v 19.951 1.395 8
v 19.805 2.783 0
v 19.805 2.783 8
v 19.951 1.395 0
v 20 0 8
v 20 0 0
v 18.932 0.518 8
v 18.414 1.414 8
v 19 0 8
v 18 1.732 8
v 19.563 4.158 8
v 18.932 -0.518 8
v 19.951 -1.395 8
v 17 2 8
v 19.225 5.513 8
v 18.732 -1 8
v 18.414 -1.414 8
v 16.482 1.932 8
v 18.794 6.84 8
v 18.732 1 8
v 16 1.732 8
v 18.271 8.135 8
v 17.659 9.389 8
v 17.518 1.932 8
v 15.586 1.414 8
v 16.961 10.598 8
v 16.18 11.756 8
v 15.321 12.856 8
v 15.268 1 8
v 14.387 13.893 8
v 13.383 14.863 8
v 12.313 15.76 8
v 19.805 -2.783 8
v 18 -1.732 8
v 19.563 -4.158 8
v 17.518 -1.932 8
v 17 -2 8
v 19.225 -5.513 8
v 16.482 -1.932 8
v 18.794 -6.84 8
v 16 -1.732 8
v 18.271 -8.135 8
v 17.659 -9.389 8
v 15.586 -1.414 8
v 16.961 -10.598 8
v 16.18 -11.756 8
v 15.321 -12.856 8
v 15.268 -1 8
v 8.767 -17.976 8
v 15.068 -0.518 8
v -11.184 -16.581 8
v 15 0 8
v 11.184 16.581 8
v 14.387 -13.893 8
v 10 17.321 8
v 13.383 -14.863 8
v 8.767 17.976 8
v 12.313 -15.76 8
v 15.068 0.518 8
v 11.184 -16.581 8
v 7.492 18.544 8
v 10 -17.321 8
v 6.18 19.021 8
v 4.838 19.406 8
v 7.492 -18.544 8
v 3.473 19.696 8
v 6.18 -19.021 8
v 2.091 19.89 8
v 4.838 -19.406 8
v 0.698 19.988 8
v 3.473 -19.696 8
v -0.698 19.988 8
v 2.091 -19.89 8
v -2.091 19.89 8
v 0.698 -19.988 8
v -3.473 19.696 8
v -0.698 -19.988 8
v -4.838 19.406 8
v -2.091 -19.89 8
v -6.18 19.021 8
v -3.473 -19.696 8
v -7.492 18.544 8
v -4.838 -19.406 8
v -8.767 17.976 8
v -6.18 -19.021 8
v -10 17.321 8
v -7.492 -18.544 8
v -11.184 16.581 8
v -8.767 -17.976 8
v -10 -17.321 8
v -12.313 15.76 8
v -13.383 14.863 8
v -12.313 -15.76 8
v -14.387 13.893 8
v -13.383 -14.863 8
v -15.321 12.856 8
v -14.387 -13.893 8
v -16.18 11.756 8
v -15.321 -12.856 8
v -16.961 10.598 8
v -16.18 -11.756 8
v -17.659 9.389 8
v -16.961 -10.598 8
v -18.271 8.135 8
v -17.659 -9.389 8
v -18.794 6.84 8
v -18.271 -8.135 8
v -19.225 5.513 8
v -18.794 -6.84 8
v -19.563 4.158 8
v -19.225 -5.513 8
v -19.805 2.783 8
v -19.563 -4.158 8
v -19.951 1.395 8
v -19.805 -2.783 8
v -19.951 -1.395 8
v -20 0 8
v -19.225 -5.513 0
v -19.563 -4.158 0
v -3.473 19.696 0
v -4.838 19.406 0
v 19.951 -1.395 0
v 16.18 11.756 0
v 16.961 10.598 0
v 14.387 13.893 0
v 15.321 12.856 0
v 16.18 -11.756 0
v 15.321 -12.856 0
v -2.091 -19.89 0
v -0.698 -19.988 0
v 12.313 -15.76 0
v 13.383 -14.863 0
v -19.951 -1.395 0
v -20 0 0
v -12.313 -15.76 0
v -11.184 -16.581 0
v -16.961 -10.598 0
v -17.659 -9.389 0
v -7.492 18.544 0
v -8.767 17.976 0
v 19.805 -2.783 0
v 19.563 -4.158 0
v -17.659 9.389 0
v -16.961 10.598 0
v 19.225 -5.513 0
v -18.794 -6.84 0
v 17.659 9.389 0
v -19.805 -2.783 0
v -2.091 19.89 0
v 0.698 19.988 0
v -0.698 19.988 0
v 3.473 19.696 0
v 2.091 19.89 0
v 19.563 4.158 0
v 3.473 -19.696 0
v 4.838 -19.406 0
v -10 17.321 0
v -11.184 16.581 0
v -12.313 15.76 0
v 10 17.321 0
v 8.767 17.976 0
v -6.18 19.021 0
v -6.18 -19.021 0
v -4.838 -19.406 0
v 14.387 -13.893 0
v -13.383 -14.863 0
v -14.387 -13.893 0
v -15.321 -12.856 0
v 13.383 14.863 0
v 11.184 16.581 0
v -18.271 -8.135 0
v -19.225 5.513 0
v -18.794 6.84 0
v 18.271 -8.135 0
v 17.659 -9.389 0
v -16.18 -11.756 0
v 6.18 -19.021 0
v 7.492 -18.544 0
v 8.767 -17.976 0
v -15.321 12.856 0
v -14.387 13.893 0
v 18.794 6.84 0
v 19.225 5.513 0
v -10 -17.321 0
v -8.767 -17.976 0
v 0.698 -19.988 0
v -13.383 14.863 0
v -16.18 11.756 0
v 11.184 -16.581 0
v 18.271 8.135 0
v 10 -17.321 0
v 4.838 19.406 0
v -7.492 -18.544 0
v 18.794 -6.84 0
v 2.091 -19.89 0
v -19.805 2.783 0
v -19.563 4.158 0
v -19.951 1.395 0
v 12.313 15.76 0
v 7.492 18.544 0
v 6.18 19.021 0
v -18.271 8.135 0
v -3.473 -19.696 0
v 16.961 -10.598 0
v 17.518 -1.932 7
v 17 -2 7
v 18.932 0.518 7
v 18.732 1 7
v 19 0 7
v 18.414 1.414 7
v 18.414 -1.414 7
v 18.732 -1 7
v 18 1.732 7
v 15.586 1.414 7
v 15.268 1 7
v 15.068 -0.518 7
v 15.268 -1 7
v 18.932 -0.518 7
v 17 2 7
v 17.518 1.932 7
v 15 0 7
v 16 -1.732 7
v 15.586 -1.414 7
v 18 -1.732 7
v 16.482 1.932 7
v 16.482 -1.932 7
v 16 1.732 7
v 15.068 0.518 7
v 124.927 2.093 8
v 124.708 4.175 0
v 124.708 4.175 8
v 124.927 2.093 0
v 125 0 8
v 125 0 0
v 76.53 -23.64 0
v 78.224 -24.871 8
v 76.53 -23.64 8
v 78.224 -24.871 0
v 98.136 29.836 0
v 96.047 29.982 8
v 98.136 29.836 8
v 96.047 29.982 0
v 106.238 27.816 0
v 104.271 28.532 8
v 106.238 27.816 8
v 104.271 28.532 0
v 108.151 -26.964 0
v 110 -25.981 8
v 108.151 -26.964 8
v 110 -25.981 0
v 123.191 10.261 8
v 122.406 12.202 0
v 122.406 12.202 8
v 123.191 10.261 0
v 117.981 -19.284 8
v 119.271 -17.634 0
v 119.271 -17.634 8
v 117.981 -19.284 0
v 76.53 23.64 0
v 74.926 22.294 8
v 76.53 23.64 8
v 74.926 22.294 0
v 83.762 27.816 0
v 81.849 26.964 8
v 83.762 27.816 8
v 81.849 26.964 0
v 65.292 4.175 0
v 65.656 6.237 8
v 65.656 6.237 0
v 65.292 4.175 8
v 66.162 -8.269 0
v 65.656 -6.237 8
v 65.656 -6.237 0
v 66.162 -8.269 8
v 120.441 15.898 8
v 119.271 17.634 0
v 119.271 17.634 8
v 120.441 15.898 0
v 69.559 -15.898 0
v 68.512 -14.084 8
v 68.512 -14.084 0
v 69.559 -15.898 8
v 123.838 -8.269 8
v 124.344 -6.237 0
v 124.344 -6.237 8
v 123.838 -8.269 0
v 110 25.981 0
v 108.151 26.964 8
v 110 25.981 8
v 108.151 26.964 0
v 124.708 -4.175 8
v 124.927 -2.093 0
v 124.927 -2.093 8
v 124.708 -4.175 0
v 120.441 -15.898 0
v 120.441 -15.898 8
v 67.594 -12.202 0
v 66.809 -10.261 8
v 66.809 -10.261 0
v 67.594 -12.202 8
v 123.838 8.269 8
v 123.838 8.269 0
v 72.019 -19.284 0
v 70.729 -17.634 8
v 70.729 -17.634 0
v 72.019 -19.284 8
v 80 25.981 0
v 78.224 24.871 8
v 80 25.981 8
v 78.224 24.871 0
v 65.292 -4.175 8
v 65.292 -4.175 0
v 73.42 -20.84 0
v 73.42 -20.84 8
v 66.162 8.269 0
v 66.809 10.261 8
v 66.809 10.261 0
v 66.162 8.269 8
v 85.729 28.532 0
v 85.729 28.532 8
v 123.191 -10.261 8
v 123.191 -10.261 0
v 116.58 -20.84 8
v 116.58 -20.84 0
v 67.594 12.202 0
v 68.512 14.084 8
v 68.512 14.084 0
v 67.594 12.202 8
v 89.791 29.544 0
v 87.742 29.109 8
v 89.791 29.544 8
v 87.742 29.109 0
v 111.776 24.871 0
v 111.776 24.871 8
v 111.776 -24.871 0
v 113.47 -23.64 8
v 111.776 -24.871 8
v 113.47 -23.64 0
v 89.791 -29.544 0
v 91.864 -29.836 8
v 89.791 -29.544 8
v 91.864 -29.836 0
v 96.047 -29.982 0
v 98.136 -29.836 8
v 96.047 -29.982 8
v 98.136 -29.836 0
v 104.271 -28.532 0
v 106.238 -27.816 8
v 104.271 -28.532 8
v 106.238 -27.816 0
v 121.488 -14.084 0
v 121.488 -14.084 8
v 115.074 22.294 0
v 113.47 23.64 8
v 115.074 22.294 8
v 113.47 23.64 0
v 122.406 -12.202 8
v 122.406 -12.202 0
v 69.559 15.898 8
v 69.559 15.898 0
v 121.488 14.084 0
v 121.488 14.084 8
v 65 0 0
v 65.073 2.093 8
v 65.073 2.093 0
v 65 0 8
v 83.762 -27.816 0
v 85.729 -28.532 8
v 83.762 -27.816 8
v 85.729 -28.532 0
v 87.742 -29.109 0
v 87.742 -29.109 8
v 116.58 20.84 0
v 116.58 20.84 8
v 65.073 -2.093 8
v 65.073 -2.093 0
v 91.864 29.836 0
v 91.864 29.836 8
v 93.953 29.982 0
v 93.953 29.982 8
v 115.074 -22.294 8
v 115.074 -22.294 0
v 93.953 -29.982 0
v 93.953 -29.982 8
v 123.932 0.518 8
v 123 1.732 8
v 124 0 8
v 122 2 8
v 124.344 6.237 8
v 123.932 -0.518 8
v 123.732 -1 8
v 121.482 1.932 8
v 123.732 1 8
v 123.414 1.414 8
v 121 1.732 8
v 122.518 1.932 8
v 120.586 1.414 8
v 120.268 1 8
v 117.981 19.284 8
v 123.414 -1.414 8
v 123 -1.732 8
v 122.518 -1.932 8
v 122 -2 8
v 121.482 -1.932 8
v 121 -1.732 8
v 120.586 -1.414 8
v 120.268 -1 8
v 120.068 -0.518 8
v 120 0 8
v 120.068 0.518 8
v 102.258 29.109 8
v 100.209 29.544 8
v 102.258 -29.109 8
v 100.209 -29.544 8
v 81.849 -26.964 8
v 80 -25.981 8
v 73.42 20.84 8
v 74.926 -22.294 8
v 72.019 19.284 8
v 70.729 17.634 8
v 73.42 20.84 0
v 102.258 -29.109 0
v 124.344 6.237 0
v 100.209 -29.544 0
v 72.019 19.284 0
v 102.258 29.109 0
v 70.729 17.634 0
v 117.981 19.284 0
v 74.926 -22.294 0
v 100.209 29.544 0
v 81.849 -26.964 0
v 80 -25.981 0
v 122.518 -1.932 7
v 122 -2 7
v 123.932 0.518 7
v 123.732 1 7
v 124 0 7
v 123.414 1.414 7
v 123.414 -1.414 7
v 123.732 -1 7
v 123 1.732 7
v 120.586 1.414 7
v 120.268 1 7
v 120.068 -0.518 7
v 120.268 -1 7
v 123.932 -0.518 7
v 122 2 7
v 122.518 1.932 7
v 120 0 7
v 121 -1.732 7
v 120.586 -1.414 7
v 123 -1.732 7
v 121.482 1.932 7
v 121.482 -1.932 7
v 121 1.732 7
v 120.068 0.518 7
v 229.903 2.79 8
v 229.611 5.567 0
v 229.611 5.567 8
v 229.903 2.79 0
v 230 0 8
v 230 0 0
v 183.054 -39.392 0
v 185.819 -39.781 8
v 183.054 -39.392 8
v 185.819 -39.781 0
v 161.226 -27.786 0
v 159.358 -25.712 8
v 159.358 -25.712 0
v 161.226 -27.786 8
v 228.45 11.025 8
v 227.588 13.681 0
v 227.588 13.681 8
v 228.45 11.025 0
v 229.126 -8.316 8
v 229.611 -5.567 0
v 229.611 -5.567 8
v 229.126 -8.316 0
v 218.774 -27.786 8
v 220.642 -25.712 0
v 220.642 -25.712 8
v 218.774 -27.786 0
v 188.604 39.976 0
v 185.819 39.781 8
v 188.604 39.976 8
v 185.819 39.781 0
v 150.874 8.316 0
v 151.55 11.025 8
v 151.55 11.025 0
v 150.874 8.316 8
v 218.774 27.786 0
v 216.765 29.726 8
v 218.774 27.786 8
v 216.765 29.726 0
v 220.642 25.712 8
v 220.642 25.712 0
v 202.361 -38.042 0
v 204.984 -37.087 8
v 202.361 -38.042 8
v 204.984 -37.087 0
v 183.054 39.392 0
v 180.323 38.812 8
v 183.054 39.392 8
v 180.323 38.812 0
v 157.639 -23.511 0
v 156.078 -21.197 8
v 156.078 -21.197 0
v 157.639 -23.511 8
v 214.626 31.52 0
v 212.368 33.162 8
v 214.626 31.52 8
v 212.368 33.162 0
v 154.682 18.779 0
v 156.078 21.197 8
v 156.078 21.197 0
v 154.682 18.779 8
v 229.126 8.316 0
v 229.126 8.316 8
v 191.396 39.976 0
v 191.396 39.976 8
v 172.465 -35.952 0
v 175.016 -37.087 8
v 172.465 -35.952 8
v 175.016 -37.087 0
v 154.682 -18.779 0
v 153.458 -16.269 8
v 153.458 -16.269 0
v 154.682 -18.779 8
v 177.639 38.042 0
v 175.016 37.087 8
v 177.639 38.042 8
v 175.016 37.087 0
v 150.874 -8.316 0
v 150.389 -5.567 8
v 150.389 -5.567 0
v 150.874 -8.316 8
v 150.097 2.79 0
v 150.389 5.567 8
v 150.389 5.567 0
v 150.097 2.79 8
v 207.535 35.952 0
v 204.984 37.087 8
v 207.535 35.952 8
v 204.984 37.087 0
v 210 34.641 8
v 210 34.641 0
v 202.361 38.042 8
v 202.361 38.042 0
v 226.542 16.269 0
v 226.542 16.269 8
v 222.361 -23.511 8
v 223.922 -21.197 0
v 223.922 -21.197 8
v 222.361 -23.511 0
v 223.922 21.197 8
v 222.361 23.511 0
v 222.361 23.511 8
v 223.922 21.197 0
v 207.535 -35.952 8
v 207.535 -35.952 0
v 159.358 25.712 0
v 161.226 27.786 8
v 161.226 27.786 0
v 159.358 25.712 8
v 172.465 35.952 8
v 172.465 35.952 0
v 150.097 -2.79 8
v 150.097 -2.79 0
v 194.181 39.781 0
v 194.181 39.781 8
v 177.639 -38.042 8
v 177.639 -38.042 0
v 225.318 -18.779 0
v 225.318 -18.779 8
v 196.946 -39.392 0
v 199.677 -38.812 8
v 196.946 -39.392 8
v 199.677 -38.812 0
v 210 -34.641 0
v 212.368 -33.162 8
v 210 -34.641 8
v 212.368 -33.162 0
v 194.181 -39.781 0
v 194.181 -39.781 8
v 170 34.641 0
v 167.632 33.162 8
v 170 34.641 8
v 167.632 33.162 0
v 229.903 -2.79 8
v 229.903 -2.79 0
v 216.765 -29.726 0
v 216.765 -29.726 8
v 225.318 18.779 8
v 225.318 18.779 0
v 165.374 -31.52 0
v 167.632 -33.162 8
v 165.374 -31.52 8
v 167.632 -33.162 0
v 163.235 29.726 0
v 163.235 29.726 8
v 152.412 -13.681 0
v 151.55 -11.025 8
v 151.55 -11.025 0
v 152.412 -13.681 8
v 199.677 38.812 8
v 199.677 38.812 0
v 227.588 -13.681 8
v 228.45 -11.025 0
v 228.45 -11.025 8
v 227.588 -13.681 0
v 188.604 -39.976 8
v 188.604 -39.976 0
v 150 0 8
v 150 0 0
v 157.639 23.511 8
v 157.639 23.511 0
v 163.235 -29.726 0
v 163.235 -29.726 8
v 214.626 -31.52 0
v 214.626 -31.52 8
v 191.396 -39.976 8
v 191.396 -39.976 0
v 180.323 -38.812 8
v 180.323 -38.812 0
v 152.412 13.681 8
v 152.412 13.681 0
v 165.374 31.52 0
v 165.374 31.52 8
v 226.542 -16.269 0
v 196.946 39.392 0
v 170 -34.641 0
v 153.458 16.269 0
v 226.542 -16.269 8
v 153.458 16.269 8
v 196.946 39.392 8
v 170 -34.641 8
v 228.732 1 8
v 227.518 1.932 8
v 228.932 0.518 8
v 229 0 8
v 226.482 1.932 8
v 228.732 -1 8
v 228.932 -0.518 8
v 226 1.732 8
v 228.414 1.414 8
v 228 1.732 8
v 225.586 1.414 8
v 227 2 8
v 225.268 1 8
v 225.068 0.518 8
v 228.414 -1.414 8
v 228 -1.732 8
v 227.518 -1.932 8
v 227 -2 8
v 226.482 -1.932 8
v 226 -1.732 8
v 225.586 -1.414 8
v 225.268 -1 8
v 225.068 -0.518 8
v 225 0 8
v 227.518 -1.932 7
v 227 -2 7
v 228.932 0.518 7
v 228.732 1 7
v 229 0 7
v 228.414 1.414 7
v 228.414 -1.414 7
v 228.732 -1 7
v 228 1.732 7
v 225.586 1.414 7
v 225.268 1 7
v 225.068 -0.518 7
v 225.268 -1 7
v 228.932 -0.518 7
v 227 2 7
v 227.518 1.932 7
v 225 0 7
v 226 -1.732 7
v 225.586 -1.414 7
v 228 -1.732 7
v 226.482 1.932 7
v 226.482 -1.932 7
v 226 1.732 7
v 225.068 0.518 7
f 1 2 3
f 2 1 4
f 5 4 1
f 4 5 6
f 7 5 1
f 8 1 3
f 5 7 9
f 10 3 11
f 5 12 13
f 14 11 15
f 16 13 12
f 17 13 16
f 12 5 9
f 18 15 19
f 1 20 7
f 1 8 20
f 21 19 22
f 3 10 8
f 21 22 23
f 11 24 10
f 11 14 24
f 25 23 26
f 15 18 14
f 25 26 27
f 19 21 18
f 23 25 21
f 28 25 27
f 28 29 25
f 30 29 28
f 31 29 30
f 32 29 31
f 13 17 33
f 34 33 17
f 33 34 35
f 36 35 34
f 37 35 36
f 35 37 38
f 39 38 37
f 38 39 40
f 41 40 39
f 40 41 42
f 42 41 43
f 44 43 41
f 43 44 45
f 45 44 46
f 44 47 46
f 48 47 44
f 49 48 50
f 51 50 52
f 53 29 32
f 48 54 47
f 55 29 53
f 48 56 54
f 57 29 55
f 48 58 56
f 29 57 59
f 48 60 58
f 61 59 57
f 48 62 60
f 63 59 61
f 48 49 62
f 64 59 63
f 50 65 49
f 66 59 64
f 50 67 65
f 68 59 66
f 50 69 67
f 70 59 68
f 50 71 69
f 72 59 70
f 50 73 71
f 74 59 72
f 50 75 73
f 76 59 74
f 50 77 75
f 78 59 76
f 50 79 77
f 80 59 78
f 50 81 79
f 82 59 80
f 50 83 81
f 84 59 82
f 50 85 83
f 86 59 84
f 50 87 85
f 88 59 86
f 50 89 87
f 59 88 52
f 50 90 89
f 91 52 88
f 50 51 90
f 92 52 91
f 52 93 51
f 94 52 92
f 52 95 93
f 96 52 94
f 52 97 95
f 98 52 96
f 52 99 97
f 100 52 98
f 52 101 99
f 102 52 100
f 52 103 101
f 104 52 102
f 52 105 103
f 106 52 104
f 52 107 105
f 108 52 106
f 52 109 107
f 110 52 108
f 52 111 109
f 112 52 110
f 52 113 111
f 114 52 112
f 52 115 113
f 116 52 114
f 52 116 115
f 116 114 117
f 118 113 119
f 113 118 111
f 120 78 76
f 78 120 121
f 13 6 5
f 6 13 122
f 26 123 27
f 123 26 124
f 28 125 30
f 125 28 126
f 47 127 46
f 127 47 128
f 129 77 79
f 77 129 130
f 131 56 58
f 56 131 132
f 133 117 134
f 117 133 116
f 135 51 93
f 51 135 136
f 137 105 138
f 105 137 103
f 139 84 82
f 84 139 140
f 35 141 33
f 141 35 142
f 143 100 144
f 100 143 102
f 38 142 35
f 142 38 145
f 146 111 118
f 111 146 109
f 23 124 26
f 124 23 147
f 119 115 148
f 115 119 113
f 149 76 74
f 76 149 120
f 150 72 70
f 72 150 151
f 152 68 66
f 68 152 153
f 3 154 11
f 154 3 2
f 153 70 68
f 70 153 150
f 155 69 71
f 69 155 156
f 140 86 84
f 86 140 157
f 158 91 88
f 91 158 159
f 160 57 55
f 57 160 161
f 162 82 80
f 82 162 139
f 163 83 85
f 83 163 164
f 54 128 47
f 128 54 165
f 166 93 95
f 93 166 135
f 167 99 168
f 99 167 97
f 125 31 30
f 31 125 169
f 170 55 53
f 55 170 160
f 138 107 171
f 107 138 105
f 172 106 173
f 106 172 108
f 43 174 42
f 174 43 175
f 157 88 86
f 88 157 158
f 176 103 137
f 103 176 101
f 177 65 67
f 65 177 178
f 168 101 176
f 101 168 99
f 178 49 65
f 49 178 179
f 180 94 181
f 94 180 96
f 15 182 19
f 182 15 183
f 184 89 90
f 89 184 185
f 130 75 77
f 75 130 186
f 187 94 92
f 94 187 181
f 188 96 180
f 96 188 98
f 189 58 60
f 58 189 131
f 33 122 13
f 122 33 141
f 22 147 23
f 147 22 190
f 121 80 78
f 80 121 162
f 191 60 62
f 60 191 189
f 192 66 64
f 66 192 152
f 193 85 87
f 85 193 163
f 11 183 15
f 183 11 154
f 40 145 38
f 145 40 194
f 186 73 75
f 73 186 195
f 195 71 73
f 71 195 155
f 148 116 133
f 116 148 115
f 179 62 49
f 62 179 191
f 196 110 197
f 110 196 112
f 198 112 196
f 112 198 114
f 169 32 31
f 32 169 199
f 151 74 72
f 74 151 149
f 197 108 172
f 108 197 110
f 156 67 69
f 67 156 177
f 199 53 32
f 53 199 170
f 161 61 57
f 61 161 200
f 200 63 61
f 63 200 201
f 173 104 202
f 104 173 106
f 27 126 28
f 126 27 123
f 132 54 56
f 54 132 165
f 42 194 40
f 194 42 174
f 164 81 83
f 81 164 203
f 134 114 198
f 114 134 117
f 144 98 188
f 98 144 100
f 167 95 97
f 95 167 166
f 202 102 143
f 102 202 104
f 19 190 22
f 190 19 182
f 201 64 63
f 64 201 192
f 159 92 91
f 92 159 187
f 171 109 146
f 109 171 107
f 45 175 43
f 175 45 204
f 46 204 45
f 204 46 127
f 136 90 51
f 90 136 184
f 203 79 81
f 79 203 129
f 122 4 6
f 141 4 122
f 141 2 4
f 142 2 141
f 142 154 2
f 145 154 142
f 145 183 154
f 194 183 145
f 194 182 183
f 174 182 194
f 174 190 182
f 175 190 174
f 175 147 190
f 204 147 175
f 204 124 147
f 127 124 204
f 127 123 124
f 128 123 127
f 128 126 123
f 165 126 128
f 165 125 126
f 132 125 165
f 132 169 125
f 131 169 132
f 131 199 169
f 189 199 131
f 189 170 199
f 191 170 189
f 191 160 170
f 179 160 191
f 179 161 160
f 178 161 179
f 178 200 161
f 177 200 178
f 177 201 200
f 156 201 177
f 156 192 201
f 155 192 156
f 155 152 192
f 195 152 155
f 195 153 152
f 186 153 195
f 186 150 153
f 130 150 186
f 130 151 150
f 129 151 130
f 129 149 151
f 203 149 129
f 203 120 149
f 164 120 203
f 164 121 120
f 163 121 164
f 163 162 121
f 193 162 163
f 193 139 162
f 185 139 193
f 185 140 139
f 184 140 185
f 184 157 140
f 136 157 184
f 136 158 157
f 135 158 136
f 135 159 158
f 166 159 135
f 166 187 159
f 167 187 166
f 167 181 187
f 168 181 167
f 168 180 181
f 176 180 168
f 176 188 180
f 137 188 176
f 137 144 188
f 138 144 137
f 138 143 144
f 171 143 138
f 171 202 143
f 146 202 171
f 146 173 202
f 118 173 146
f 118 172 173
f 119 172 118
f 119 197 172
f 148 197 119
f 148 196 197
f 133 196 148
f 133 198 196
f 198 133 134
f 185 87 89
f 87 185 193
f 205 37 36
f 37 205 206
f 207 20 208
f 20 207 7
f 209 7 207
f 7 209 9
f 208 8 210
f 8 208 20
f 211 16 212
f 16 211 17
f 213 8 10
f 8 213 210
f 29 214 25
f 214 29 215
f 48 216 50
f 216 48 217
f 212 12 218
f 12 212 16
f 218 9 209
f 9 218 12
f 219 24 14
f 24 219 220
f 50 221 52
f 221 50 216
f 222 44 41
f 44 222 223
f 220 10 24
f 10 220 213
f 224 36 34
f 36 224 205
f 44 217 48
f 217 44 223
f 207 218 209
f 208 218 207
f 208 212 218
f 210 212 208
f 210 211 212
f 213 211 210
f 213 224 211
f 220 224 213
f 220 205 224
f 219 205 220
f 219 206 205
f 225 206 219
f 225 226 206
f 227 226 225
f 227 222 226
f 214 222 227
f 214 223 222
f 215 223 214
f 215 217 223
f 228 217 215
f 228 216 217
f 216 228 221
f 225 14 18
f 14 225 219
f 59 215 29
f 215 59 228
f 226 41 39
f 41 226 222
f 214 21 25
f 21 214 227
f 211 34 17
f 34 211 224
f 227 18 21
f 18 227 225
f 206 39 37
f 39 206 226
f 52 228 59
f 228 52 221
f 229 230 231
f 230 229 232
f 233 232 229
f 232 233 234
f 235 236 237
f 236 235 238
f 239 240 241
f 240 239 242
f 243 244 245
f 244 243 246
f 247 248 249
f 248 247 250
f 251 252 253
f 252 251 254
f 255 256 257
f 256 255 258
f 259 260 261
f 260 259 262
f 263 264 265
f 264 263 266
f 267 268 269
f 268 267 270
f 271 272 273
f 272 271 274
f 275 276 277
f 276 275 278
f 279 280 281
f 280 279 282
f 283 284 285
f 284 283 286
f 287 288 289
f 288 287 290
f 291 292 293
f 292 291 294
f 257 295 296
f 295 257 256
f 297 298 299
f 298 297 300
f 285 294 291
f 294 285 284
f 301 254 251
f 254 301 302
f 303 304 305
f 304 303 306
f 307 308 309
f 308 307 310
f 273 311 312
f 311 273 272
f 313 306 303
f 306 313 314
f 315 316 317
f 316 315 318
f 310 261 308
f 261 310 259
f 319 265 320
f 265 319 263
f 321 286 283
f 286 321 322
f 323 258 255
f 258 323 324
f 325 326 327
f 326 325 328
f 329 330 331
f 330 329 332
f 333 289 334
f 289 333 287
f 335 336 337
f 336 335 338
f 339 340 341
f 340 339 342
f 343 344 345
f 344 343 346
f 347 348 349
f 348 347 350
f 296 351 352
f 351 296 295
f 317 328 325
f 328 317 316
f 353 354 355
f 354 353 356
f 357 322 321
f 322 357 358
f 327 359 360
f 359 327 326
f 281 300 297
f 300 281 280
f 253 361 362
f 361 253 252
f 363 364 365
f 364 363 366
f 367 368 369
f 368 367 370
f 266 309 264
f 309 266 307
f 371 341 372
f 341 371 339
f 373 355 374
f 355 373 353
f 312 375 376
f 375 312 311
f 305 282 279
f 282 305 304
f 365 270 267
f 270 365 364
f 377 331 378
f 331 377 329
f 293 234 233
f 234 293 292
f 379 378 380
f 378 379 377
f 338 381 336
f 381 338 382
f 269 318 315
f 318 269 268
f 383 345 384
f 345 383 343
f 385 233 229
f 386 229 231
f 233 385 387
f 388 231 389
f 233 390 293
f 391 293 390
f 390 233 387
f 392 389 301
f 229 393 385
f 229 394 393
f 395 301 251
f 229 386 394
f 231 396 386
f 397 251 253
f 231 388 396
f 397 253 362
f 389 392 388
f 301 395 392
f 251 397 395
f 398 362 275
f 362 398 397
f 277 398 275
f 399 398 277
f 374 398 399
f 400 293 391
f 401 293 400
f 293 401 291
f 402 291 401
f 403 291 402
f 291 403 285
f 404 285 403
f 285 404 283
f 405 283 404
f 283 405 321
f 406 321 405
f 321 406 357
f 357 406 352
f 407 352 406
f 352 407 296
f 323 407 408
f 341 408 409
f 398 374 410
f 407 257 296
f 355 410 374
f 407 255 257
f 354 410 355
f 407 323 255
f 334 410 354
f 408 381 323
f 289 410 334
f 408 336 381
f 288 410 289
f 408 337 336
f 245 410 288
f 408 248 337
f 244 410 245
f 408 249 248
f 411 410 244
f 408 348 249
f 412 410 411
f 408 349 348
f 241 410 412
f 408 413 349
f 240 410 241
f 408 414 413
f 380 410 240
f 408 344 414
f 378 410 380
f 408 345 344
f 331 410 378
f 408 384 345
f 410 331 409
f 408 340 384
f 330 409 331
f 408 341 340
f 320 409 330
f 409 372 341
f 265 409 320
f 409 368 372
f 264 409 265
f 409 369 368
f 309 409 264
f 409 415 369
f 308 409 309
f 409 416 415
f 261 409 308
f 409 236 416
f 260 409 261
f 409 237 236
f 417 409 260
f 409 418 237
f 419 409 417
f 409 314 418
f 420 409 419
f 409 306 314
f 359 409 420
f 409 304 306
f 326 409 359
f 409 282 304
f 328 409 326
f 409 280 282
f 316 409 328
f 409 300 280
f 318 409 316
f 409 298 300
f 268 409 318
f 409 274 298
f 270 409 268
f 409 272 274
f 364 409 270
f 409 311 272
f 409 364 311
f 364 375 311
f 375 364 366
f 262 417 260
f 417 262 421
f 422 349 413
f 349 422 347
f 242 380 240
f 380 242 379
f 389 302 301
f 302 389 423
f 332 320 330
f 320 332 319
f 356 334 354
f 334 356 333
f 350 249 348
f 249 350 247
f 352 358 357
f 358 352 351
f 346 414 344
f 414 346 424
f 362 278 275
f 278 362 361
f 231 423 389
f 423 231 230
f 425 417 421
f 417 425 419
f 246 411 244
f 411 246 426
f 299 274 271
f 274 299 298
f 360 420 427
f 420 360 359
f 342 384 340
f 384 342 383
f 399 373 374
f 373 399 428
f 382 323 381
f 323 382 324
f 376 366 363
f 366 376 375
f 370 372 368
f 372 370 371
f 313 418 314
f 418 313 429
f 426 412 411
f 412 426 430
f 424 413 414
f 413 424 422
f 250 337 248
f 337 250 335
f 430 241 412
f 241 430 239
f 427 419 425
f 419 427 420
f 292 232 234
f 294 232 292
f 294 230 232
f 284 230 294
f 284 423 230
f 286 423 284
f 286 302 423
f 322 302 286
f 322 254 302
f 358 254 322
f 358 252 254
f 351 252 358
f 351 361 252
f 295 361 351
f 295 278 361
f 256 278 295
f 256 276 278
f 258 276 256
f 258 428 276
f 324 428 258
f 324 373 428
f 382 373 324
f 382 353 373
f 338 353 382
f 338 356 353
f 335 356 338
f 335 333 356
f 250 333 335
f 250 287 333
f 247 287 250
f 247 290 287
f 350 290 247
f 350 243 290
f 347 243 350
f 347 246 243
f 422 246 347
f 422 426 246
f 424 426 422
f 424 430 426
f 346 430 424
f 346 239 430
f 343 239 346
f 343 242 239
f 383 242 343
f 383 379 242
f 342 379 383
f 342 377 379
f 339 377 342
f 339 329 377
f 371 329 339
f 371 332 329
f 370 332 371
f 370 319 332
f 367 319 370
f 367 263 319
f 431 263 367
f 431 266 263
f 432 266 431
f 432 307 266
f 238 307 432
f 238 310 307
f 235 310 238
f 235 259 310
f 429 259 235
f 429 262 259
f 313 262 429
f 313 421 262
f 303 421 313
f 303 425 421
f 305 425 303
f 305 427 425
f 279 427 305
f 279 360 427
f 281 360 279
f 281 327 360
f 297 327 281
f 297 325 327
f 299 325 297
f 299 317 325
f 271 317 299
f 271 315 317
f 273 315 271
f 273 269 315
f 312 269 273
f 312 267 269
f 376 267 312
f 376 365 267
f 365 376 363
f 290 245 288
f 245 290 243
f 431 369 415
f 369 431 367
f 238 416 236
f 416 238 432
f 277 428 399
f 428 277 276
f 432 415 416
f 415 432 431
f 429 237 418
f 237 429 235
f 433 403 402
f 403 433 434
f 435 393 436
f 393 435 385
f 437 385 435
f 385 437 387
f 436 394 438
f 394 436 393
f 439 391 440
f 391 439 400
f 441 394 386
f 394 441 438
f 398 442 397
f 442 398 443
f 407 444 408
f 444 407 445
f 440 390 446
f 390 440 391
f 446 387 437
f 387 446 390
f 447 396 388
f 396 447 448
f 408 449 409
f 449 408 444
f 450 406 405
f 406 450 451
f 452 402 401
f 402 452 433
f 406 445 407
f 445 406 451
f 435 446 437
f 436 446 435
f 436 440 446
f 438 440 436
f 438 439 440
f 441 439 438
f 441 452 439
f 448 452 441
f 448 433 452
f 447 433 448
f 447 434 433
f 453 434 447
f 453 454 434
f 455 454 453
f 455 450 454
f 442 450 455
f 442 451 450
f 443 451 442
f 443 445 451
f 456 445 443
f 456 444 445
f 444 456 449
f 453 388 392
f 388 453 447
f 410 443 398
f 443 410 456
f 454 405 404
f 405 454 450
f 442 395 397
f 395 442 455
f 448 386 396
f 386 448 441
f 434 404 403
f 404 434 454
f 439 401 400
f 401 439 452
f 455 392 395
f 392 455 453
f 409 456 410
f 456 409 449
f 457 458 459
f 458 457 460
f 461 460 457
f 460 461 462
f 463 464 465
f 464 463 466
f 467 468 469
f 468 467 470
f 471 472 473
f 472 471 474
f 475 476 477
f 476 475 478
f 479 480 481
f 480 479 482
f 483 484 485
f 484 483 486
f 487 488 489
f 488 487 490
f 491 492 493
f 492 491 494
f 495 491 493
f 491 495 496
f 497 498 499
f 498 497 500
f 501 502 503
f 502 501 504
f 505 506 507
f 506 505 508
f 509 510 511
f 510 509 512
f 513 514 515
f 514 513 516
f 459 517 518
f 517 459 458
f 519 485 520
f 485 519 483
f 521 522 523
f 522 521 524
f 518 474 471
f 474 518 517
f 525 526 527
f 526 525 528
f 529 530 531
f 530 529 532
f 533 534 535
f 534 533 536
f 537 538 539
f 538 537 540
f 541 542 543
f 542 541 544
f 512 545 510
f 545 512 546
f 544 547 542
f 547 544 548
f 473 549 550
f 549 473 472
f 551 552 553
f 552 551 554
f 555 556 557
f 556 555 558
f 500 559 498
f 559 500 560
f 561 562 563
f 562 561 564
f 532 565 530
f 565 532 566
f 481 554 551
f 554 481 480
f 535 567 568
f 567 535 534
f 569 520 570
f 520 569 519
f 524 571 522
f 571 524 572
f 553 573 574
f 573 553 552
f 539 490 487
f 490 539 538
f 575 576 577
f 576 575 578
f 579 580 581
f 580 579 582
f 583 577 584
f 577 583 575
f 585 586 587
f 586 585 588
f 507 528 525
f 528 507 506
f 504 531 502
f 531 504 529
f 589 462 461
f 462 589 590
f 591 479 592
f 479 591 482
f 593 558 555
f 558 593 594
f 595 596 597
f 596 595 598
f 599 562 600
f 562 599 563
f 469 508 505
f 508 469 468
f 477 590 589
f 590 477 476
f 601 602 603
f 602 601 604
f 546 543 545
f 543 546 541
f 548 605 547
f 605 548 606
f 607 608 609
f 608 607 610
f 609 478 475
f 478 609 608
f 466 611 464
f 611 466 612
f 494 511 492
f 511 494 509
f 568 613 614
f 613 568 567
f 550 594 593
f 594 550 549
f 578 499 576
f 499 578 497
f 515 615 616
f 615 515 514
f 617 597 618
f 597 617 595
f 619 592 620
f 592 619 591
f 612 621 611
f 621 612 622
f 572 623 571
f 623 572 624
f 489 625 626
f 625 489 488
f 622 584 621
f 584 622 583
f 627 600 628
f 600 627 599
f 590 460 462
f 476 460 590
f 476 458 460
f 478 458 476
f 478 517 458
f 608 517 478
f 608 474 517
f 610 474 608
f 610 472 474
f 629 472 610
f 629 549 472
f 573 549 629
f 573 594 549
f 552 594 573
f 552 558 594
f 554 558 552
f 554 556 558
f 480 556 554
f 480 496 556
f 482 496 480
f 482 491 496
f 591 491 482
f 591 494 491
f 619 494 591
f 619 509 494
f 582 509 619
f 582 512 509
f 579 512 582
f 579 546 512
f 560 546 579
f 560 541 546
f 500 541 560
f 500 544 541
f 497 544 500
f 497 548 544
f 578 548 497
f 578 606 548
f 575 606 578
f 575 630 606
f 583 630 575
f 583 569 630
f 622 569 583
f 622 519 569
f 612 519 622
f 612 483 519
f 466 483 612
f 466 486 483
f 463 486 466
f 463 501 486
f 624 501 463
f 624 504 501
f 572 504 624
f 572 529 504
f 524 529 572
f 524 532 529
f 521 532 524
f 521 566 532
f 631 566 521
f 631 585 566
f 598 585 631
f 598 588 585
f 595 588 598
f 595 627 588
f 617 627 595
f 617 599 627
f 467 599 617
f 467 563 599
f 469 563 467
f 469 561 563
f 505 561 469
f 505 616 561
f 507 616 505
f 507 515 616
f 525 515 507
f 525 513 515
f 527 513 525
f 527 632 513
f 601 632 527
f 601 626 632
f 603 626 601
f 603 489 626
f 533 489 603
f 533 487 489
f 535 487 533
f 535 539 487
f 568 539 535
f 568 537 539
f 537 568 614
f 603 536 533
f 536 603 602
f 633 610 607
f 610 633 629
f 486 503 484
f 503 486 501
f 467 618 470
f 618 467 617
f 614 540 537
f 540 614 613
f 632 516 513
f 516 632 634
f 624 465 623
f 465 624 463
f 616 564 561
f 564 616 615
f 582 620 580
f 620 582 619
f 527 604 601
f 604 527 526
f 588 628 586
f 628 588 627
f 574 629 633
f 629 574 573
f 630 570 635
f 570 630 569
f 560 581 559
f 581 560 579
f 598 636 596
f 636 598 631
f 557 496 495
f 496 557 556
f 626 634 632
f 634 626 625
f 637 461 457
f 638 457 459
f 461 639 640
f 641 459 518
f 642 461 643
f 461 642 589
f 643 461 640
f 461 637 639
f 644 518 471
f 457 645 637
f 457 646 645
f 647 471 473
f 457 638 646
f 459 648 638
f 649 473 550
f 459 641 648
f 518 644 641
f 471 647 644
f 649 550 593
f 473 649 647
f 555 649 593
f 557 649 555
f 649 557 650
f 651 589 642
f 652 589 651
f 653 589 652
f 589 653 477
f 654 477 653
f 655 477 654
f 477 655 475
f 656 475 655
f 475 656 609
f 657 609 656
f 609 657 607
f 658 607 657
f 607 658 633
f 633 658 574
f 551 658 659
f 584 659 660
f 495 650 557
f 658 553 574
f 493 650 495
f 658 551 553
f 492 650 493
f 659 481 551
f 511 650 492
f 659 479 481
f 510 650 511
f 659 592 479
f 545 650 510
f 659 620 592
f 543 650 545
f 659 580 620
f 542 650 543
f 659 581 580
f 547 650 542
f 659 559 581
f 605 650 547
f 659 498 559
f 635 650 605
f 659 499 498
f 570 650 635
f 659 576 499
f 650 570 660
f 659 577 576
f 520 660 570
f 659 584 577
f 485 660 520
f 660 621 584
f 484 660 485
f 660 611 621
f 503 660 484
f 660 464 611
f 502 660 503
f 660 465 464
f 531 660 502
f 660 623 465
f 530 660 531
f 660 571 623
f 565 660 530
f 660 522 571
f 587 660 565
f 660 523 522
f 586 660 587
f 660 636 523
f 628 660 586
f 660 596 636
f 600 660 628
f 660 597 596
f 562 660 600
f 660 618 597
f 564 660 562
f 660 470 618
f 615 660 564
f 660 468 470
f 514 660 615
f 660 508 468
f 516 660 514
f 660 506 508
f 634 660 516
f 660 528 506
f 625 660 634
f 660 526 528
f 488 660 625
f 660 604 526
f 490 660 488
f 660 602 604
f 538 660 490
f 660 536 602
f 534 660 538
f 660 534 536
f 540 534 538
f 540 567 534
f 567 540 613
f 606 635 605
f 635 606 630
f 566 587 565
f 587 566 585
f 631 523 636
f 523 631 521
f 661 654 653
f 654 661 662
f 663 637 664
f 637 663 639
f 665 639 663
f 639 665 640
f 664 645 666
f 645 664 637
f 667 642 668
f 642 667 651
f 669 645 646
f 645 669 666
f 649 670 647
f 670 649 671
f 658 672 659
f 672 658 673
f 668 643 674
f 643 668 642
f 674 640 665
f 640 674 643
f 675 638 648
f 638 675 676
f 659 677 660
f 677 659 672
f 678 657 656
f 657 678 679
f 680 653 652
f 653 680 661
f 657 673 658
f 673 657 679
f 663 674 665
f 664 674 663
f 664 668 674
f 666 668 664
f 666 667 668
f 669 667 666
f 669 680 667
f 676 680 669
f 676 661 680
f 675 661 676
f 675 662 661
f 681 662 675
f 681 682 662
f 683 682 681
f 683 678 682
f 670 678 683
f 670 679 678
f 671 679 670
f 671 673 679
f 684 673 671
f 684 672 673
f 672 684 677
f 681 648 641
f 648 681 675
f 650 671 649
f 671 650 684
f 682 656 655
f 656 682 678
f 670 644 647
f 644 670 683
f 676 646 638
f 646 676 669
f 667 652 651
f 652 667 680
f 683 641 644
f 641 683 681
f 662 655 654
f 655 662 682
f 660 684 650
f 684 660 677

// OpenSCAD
/*
Title: Rolling Motion Wheel Set
Folder: 13_rolling_motion
Physics Topic: Rolling without slipping
Difficulty: Beginner-Intermediate
Print Type: FDM, single material
Teaches: Conceptual mechanics
Use Case: Classroom manipulative
*/


// --------------------
// Parameters
// --------------------
wheel_diameters = [40,60,80];
thickness = 8;
marker_depth = 1;

module wheel(d=60){
    difference(){
        cylinder(h=thickness,d=d,$fn=90);
        translate([d/2-3,0,thickness-marker_depth]) cylinder(h=marker_depth+0.1,d=4,$fn=24);
    }
}

for(i=[0:len(wheel_diameters)-1])
    translate([i*95,0,0]) wheel(wheel_diameters[i]);
